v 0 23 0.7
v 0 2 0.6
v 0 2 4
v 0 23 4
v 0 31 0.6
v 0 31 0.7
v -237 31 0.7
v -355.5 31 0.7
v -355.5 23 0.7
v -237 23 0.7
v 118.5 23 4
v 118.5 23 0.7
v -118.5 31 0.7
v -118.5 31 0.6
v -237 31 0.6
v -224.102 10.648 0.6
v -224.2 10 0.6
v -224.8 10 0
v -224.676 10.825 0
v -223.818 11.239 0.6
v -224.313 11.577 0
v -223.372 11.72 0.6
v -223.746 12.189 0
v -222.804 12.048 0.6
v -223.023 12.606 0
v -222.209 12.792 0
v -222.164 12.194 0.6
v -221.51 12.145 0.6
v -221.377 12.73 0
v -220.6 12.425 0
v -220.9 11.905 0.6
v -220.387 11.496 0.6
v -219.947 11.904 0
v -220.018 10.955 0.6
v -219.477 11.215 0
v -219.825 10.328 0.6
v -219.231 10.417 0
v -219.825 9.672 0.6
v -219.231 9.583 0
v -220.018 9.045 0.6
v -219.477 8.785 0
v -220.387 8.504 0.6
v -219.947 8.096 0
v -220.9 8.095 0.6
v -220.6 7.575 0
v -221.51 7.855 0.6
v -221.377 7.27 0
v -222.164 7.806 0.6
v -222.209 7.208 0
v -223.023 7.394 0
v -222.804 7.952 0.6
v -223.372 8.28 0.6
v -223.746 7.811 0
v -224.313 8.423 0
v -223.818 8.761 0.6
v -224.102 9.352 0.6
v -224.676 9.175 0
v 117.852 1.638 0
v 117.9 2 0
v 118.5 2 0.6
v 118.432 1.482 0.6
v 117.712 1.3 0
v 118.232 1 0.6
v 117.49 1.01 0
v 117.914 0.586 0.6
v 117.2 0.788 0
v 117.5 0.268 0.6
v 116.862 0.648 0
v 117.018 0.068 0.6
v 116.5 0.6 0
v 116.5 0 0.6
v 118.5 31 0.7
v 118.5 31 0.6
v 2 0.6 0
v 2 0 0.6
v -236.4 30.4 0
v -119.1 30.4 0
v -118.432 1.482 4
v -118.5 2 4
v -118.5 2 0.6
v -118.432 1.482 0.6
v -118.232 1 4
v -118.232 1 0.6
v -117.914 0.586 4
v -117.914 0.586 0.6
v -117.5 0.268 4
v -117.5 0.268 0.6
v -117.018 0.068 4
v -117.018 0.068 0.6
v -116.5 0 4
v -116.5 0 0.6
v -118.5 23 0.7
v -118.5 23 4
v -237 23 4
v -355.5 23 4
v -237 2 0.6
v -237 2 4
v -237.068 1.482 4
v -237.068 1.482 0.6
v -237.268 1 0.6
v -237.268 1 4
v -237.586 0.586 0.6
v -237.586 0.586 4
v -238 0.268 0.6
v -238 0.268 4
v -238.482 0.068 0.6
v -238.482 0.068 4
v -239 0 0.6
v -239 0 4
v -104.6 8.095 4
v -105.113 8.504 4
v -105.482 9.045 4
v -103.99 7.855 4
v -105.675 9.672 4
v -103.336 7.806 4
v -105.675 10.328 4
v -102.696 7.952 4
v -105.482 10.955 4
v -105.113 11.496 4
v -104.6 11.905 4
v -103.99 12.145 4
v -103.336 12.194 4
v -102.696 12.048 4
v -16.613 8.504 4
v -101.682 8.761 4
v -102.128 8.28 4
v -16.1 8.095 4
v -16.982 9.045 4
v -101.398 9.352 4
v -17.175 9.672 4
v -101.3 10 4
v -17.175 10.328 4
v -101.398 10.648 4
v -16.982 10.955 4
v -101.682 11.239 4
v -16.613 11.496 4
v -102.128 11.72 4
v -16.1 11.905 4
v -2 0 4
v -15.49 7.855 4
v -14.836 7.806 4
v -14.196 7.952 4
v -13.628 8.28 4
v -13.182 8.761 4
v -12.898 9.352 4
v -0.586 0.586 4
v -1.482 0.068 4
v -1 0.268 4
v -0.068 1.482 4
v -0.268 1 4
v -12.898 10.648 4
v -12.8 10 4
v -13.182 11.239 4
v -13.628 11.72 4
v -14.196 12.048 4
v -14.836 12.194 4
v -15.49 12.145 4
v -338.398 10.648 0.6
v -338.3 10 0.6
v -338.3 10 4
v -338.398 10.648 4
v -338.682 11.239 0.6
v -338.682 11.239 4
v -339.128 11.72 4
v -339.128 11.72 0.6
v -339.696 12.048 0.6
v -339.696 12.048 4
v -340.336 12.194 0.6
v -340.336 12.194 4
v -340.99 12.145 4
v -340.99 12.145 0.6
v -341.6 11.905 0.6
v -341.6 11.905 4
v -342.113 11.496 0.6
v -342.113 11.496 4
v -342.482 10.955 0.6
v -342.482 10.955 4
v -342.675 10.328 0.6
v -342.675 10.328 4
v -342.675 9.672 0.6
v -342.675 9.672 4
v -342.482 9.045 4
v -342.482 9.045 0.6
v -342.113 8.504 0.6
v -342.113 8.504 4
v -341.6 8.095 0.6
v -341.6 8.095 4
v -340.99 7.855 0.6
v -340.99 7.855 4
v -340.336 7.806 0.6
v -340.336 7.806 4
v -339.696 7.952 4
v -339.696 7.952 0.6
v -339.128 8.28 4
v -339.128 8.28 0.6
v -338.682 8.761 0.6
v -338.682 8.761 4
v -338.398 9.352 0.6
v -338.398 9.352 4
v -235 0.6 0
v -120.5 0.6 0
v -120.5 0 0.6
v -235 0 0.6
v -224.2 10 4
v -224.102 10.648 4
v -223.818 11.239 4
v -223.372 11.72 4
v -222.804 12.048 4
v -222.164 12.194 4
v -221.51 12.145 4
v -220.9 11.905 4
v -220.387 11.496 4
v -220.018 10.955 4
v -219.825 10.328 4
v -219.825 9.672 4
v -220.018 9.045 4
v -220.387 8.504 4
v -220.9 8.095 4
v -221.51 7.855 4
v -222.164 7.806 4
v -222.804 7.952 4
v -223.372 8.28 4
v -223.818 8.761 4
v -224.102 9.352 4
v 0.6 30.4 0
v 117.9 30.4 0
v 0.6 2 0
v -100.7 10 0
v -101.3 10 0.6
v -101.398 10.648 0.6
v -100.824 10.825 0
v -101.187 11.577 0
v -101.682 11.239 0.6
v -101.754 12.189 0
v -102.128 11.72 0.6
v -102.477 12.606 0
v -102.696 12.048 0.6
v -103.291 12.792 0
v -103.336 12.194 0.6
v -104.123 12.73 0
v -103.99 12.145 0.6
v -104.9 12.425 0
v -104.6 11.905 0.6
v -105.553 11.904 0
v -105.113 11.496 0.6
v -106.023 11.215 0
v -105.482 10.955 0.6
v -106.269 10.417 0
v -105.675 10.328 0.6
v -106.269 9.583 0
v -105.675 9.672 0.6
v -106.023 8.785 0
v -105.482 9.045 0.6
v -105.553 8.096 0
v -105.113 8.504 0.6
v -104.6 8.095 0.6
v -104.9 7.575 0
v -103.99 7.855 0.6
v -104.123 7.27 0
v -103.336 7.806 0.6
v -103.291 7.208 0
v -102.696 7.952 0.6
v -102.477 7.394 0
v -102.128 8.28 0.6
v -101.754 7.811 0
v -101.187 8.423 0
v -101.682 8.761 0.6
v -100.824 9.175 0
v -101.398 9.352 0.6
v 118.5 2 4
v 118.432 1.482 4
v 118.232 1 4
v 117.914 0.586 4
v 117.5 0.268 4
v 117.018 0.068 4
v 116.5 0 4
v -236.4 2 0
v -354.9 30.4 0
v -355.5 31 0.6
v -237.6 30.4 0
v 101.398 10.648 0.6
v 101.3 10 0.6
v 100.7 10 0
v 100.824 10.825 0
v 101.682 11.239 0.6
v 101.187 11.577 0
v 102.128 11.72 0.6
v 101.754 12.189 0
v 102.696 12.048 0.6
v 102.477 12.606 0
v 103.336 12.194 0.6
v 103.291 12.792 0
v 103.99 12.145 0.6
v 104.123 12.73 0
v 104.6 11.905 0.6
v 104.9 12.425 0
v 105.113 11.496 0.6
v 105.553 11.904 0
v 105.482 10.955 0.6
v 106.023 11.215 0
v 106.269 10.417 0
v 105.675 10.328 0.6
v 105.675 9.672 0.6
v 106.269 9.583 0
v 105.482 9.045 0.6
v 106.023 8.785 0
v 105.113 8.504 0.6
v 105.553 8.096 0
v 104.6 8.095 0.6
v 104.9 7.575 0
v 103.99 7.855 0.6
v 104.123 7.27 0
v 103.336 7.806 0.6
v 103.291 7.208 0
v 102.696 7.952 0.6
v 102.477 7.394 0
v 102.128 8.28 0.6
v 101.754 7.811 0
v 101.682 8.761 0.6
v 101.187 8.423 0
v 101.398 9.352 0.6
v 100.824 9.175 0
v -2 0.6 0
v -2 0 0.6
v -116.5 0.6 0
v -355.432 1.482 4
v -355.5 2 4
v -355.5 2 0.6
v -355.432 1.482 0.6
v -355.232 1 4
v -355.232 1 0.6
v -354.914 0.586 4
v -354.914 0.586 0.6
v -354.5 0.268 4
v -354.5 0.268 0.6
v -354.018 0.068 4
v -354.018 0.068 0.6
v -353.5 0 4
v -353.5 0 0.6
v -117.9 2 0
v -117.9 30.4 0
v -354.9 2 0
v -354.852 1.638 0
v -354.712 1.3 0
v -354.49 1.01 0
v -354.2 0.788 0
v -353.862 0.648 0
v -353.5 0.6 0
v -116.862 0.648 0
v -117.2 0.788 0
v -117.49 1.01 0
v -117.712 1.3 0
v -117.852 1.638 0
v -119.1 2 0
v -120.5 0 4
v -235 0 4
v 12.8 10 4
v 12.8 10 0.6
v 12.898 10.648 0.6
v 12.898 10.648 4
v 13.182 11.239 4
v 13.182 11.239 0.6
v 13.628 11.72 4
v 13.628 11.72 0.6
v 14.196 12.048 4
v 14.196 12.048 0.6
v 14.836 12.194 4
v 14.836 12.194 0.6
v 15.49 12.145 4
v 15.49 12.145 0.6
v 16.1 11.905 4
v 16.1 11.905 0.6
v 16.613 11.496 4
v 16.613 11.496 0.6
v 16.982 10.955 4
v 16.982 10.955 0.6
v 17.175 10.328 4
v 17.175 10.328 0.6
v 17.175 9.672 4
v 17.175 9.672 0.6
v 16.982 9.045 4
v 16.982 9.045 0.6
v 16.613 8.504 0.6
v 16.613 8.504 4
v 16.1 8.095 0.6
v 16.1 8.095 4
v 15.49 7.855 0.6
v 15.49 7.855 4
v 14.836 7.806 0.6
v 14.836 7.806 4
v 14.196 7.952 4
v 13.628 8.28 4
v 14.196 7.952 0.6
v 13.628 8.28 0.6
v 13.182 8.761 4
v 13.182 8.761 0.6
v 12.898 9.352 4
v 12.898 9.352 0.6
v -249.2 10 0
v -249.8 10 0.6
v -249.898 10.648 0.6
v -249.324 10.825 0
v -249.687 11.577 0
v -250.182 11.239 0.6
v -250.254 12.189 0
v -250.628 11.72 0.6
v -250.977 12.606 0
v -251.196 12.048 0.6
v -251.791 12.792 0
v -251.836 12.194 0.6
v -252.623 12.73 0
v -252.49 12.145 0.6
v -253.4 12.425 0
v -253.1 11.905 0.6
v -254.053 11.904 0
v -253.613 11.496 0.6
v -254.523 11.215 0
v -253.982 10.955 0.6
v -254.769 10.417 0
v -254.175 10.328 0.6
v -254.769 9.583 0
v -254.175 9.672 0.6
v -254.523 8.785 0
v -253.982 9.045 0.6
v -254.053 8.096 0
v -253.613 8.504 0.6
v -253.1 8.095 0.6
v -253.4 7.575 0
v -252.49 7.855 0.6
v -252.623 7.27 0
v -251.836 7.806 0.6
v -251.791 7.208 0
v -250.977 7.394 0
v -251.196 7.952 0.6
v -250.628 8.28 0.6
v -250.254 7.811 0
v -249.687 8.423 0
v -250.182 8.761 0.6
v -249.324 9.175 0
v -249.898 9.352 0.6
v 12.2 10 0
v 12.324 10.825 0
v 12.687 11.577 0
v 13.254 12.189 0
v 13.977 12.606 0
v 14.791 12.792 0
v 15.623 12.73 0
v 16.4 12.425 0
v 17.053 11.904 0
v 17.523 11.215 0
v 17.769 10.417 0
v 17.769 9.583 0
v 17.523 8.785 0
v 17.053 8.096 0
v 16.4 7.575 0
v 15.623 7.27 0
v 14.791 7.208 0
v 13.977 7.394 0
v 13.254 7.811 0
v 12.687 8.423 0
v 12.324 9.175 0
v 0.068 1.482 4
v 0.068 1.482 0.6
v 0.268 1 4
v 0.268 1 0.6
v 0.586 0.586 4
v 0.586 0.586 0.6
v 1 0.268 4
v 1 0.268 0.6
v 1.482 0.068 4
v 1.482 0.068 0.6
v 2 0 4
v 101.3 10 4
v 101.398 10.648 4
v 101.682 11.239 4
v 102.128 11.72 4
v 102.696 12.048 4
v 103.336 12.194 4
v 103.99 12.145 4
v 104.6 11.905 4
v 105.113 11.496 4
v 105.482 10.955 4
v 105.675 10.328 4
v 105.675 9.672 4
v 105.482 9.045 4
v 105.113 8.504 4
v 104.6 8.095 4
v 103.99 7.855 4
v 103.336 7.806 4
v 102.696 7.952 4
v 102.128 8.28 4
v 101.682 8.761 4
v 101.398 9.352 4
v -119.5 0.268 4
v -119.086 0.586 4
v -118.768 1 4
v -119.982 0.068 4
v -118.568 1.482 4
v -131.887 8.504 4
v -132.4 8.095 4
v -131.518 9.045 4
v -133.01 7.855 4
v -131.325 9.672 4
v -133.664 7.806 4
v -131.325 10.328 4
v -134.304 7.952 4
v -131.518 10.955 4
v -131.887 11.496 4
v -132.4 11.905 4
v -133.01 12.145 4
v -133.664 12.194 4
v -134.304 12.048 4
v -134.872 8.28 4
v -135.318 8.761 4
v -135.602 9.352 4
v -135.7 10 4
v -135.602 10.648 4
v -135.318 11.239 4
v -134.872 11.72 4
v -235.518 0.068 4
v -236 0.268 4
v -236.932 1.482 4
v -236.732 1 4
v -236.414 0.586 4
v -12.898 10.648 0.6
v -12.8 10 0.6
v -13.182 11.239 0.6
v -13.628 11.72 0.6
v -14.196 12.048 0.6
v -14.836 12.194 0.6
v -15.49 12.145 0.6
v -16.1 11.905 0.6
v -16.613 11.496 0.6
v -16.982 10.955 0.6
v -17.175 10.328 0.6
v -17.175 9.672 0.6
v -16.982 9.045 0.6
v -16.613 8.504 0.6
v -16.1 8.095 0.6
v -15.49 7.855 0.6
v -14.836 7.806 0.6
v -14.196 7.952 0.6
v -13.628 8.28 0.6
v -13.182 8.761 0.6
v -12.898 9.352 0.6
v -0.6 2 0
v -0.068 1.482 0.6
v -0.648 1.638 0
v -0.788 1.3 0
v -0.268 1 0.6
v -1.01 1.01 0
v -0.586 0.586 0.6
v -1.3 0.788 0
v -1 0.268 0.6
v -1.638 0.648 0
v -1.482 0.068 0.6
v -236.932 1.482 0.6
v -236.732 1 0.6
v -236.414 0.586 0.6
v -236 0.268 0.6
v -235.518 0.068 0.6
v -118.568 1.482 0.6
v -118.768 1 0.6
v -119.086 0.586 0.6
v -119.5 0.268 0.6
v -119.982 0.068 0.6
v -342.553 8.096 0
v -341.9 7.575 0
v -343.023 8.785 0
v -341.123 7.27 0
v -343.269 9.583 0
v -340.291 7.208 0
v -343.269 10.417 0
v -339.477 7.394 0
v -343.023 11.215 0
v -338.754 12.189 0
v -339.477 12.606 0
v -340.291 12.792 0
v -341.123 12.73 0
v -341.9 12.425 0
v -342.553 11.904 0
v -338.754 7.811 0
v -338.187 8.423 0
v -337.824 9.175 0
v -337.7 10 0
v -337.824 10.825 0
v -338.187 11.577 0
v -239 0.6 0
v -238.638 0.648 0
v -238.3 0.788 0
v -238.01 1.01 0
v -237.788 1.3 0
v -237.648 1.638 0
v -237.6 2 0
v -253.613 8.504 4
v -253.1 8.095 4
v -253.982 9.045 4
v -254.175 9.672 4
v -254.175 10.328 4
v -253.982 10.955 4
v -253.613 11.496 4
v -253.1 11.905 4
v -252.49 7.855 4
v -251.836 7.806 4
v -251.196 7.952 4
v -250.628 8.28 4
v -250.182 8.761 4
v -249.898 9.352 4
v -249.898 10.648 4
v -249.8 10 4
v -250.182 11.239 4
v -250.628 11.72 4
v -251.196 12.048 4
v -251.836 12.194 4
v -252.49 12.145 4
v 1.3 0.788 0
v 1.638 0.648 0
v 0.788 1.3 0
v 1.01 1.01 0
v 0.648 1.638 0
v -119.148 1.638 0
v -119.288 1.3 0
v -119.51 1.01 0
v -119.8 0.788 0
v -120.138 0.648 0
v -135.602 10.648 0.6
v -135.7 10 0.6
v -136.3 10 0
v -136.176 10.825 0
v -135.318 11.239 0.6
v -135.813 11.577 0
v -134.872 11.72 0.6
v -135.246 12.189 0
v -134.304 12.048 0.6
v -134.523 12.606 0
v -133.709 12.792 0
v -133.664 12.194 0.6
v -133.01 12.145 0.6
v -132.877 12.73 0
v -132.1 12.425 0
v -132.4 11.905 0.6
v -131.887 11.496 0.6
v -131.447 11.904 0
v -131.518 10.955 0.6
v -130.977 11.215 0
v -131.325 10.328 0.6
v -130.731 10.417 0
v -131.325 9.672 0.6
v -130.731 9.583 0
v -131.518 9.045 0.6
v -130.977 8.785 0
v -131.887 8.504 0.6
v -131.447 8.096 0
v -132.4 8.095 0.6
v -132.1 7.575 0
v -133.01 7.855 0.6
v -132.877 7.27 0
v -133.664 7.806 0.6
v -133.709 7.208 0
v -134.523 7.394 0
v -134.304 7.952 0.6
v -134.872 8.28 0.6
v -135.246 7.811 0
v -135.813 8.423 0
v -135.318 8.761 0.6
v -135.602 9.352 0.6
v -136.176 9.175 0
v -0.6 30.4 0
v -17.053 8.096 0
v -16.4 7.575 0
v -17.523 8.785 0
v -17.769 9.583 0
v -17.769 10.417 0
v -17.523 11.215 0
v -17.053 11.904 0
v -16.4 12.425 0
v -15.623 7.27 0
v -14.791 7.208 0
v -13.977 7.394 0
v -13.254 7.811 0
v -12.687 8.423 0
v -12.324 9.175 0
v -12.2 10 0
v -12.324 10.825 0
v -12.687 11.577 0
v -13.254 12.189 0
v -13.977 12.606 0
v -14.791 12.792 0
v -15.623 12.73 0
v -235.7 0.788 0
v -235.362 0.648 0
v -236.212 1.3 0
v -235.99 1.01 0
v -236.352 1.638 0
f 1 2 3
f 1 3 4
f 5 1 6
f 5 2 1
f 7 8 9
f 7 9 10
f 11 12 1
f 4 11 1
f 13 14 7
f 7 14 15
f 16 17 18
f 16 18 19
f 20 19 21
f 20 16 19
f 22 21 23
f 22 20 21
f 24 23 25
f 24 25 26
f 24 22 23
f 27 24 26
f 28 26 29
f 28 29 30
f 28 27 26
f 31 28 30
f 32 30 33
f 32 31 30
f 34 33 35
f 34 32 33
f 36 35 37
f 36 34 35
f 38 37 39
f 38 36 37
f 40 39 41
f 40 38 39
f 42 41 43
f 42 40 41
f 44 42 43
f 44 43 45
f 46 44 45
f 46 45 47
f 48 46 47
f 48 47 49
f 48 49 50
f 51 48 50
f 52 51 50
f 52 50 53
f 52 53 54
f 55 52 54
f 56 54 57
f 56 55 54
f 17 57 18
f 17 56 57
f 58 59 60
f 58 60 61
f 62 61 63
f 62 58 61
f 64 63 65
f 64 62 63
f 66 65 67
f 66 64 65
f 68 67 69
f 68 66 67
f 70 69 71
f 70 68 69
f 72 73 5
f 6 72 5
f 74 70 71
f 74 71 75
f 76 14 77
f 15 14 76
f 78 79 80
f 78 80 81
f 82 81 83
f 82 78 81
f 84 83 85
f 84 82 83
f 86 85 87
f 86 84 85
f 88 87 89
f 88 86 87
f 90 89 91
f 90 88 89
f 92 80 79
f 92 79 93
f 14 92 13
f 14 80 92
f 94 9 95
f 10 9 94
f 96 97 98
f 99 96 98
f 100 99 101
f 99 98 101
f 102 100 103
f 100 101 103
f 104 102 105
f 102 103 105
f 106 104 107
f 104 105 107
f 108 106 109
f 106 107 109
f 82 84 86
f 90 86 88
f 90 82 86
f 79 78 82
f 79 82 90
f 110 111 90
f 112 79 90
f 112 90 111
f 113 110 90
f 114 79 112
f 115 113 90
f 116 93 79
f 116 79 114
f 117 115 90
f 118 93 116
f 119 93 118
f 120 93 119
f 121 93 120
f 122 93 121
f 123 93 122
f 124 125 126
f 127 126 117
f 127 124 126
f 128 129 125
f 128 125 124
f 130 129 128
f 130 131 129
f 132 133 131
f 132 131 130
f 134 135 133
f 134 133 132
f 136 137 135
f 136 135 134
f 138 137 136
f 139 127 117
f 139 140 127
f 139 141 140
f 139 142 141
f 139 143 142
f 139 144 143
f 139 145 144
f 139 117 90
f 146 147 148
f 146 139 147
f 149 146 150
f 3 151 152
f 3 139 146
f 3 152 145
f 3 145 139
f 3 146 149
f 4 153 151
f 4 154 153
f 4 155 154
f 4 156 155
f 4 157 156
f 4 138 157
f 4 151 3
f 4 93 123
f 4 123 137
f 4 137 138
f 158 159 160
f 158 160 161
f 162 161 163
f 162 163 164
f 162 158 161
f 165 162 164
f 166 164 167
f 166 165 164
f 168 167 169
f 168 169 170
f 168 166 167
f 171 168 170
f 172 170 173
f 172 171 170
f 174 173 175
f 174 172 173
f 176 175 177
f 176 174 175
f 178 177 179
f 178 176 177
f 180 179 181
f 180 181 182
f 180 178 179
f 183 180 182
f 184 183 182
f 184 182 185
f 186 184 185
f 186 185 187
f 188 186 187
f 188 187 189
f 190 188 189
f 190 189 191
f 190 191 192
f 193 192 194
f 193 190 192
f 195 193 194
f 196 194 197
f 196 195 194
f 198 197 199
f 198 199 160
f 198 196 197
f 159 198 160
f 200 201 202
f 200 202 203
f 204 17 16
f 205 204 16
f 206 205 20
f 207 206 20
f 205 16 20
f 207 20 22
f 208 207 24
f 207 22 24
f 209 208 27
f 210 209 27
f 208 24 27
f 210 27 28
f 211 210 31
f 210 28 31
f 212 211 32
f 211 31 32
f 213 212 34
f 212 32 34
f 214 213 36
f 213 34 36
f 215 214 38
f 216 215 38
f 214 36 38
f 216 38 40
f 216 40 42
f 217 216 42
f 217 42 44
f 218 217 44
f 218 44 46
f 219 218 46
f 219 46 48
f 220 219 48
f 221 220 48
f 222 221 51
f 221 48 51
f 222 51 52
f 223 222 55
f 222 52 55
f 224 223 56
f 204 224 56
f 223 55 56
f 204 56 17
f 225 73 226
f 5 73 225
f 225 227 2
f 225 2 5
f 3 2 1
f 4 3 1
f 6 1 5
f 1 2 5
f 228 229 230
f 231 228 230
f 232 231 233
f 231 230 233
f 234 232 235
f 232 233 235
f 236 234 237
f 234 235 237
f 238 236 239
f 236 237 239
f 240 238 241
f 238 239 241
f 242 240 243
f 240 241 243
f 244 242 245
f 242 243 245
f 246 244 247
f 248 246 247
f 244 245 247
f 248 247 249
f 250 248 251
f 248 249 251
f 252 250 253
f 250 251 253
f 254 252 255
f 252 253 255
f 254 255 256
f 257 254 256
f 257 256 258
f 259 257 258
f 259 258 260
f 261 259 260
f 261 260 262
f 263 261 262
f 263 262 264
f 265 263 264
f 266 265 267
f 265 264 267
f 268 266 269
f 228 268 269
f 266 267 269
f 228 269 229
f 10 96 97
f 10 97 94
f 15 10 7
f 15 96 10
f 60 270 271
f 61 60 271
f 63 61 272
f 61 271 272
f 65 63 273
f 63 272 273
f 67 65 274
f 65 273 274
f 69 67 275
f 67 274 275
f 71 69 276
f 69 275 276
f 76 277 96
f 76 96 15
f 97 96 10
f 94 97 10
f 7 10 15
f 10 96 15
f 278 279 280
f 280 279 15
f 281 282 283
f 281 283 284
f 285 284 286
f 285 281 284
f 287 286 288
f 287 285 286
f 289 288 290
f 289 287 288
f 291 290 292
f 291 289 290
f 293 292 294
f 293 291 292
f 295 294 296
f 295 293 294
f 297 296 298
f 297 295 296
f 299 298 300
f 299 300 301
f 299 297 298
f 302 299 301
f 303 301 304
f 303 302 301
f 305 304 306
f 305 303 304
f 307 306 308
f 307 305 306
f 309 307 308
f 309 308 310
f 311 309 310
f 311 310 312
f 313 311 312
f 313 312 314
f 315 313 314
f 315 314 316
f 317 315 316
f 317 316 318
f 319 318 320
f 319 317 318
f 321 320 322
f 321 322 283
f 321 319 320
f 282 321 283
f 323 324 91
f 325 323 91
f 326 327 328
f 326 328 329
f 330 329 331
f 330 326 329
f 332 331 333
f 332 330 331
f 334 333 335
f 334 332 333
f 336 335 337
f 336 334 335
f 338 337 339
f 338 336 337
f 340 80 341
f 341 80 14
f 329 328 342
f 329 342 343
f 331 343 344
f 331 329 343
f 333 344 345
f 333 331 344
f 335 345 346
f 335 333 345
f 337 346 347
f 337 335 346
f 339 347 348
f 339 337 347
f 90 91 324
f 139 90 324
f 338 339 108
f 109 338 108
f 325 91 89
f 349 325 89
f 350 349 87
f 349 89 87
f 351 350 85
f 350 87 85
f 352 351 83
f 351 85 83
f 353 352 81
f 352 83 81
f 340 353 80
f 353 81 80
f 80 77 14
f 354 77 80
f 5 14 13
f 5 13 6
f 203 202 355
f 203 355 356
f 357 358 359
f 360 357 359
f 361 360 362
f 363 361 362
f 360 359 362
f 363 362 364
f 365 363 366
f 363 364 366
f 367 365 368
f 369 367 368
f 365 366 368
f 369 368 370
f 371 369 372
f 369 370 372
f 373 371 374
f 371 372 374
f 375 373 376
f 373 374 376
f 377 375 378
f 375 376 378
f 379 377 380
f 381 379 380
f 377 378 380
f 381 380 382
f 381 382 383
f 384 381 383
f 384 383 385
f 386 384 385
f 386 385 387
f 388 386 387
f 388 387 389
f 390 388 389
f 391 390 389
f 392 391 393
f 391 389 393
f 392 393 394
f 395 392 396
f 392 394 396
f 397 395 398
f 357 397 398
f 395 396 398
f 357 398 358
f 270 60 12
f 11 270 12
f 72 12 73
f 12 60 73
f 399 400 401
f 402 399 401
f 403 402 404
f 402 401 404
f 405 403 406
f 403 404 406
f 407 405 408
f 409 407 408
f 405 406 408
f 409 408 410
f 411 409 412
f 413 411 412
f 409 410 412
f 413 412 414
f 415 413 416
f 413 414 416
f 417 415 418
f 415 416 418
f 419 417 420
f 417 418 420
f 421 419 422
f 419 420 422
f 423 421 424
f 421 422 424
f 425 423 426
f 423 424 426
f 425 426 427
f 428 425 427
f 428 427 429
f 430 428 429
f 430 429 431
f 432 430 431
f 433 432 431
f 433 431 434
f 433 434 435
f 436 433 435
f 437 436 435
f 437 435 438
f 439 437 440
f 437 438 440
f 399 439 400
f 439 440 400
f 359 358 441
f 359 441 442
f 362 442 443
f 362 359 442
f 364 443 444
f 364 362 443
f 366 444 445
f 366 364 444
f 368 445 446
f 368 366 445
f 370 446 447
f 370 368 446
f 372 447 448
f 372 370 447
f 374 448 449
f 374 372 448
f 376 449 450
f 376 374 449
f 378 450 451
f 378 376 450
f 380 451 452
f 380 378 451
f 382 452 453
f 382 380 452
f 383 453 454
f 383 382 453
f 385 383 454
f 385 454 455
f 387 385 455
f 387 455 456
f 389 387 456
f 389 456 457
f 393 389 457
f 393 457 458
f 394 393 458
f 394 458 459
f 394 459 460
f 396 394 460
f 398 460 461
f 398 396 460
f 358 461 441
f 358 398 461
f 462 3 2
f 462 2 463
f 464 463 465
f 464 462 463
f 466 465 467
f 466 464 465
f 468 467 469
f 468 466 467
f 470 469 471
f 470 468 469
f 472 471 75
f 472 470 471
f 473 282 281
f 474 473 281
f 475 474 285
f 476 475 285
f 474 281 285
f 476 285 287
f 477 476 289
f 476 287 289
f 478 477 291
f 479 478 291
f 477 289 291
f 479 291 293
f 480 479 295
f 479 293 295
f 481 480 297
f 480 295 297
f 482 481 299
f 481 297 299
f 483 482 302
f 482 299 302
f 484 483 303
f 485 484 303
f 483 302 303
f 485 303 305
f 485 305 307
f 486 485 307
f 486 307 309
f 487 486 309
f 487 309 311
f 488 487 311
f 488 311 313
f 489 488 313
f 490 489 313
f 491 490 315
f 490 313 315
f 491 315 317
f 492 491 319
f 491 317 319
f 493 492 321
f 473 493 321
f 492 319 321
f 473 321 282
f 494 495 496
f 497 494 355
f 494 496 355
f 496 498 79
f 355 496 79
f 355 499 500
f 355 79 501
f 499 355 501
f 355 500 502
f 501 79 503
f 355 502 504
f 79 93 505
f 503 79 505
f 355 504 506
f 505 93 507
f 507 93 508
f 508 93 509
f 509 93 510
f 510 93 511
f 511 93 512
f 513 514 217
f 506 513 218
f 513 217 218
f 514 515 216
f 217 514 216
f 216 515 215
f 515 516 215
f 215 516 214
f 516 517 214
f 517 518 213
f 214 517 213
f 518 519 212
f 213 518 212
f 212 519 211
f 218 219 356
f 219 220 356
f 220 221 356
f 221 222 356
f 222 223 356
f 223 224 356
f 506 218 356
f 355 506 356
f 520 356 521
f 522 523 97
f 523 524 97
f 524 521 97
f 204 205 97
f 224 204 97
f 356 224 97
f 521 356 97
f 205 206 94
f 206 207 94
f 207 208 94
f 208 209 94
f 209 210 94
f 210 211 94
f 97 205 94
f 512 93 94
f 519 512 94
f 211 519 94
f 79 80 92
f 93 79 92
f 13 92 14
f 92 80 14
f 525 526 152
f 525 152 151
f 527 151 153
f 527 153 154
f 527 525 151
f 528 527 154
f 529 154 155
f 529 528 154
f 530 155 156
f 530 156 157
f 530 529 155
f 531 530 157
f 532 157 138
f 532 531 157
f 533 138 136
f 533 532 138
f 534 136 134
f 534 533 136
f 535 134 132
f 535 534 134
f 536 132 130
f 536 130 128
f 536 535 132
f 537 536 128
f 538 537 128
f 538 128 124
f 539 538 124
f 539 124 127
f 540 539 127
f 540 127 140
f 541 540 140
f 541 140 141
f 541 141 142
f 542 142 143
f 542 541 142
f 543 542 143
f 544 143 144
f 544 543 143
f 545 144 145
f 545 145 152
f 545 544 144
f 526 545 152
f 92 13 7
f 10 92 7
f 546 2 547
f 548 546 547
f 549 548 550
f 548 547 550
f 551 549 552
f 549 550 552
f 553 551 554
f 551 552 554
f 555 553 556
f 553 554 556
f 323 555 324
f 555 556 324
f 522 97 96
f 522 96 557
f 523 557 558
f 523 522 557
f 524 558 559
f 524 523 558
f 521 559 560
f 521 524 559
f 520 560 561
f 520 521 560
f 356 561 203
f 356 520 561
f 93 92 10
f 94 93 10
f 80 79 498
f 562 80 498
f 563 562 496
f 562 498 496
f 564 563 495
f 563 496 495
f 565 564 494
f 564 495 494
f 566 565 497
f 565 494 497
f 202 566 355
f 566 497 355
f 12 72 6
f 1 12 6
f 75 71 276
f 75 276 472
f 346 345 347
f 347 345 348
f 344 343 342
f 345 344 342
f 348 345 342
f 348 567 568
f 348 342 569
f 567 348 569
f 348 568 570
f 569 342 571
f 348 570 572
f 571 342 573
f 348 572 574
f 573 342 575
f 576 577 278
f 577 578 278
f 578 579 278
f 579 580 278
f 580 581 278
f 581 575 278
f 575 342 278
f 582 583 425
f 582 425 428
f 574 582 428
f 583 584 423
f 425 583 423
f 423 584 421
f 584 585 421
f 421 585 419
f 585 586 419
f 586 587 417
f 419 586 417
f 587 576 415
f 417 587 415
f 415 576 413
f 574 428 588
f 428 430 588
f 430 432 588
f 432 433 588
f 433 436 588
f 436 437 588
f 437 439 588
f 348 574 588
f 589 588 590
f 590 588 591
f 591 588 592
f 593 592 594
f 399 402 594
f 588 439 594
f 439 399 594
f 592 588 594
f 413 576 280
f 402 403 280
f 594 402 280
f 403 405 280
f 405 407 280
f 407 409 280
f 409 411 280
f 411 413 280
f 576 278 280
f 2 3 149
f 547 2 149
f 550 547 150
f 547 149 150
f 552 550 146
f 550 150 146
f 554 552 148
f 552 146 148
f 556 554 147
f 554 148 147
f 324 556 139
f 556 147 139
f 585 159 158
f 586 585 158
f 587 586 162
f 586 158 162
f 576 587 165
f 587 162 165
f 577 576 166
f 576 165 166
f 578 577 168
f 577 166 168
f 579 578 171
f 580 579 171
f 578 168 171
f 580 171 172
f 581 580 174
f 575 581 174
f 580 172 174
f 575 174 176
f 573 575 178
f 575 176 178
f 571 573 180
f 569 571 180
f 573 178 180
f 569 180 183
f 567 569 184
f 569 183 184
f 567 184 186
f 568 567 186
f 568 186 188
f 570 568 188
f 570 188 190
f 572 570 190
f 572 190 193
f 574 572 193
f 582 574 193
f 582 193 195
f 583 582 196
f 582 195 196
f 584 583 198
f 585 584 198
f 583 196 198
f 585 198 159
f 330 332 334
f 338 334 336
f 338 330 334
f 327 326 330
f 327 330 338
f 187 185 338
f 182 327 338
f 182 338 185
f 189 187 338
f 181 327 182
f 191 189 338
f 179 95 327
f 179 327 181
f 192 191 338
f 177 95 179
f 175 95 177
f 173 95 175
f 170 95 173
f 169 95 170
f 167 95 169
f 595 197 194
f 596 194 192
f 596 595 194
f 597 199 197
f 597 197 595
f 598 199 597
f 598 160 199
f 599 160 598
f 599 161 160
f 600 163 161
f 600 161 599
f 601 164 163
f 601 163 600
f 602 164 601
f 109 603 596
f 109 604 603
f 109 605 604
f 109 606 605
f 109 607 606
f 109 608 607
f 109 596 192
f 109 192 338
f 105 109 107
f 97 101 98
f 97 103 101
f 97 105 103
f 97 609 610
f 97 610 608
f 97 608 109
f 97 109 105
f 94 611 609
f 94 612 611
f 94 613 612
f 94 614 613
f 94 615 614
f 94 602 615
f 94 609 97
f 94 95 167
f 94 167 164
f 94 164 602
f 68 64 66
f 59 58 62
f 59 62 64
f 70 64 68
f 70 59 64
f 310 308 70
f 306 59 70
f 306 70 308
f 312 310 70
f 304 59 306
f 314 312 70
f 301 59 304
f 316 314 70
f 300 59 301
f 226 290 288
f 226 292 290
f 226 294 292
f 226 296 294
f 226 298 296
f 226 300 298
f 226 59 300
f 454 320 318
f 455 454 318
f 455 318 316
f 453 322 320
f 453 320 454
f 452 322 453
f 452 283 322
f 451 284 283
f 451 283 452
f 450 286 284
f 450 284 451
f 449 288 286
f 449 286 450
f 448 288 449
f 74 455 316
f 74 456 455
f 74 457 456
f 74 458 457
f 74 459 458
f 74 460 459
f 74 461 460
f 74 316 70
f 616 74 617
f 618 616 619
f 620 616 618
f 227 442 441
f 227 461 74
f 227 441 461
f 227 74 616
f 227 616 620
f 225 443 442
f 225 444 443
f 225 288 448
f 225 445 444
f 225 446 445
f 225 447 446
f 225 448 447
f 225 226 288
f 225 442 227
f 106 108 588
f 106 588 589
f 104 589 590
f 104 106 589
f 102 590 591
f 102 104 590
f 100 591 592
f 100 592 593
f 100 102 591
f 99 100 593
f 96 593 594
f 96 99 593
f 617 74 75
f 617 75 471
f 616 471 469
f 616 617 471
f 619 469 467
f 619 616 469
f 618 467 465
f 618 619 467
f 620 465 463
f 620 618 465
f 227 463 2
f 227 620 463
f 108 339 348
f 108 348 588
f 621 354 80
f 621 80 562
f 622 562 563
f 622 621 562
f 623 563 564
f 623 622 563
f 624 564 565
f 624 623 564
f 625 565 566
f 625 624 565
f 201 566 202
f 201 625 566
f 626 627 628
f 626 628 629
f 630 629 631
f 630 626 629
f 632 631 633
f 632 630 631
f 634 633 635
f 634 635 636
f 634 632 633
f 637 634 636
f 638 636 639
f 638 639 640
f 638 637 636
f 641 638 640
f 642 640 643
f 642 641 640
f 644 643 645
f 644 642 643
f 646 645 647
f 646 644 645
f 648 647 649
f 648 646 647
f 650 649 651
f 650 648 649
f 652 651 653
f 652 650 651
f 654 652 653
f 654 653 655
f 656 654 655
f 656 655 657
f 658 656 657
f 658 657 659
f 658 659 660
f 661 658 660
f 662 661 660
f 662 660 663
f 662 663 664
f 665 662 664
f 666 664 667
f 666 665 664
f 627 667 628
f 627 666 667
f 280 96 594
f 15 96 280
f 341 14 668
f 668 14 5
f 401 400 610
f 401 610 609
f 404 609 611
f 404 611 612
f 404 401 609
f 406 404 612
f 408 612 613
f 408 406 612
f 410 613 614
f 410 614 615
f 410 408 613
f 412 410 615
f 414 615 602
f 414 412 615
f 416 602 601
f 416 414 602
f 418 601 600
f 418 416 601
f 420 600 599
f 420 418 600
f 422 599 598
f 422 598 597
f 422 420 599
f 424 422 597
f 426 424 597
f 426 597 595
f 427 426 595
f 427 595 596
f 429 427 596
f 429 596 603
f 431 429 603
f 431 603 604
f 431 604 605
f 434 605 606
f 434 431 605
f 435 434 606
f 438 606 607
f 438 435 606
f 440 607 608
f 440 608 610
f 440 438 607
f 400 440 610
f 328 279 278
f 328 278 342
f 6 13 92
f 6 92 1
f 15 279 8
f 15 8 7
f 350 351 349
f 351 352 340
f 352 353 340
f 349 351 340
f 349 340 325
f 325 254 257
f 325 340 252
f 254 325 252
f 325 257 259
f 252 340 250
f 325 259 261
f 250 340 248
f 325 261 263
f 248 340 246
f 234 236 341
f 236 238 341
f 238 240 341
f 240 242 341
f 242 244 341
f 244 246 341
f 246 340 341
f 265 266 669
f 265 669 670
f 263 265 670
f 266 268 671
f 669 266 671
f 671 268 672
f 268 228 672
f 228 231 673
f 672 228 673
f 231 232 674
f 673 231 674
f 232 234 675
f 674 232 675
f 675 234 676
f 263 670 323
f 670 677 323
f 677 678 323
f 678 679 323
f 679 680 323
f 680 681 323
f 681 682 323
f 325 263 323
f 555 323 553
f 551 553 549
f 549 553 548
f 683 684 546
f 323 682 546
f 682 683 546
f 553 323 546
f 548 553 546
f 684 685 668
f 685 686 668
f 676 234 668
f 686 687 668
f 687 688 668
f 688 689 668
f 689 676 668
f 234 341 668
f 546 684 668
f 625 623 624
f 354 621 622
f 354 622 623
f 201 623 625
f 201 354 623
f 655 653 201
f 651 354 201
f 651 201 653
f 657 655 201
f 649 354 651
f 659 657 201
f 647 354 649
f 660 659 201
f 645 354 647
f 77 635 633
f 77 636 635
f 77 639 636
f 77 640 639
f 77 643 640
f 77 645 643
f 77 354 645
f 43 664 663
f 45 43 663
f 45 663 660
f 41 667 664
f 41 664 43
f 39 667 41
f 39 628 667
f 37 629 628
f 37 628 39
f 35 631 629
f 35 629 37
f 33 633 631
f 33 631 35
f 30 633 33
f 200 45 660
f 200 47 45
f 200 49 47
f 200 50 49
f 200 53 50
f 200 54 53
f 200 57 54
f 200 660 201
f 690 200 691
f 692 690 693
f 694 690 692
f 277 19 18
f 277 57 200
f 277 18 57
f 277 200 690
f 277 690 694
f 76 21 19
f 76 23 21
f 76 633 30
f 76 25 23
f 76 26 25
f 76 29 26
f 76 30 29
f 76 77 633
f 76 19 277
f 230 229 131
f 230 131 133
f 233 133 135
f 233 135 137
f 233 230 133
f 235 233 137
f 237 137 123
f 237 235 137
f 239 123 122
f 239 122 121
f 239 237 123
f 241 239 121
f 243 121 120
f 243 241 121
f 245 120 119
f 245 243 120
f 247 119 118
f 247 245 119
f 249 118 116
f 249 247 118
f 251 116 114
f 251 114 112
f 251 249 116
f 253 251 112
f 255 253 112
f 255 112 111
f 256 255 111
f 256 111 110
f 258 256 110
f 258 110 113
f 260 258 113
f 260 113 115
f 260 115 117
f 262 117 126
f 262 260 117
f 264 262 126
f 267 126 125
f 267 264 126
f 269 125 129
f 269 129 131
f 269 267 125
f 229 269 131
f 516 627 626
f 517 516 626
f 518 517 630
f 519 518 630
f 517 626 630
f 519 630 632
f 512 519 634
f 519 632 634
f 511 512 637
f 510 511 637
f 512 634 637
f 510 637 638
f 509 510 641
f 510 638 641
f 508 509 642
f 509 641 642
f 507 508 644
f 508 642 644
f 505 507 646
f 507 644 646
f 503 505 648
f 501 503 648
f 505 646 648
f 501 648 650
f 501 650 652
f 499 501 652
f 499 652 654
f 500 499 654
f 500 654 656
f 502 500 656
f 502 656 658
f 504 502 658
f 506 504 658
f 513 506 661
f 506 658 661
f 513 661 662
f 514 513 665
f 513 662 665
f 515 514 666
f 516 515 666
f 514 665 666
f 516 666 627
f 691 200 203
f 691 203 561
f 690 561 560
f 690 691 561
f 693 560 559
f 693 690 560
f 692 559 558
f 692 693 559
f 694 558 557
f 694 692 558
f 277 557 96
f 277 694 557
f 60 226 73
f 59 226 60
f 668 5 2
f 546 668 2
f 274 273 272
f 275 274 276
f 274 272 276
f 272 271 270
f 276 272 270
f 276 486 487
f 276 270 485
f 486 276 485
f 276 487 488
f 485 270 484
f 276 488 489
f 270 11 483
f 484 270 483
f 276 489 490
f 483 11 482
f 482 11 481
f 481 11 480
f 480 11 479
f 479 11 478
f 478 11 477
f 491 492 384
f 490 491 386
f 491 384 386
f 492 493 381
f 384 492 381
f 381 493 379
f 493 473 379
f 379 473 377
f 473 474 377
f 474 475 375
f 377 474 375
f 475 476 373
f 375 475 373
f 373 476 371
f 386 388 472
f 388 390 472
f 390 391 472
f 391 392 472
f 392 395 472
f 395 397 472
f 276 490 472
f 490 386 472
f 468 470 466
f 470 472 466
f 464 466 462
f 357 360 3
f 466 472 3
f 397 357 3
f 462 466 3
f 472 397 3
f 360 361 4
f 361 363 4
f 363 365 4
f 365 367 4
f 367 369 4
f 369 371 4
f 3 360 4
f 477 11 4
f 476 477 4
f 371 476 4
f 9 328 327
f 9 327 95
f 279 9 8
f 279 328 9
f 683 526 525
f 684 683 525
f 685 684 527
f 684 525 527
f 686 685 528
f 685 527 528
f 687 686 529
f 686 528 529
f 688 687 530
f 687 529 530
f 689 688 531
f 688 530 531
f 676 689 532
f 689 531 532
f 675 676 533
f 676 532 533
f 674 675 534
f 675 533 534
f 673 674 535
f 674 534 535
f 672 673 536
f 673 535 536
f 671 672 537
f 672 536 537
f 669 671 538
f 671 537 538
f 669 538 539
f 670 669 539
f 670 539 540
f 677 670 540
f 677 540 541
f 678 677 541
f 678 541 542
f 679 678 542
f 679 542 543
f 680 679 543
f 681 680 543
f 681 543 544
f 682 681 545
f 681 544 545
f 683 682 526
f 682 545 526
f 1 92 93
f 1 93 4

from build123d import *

# Parameters (mm, degrees)
SKETCH1_W           = 118.5
SKETCH1_H           = 23
SKETCH1_R           = 2.2
BOSS_EXTRUDE1_DEPTH = 4
SKETCH1_3_W         = 118.5
SKETCH1_3_H         = 8
BOSS_EXTRUDE2_DEPTH = 0.7
FILLET2_R           = 2
FILLET3_R           = 2
FILLET5_R           = 2
FILLET6_R           = 2
CHAMFER6_SIZE       = 0.6
CHAMFER5_SIZE       = 0.6
CHAMFER3_SIZE       = 0.6
CHAMFER4_SIZE       = 0.6


with BuildPart() as part:
    # Sketch1 → Boss-Extrude1 (new body)
    with BuildSketch(Plane.XY):
        with Locations((-59.25, 11.5)):
            Rectangle(SKETCH1_W, SKETCH1_H)
        with Locations((-15, 10)):
            Circle(SKETCH1_R, mode=Mode.SUBTRACT)
        with Locations((-103.5, 10)):
            Circle(SKETCH1_R, mode=Mode.SUBTRACT)
    extrude(amount=BOSS_EXTRUDE1_DEPTH)

    # Sketch1<3> → Boss-Extrude2 (add)
    with BuildSketch(Plane.XY):
        with Locations((-59.25, 27)):
            Rectangle(SKETCH1_3_W, SKETCH1_3_H)
    extrude(amount=BOSS_EXTRUDE2_DEPTH)


with BuildPart() as body_2:
    # Mirror1: mirrored copy
    add(part.part.mirror(Plane(origin=(0, 0, 4), x_dir=(0, 0, 1), z_dir=(-1, 0, 0))))


with BuildPart() as body_3:
    # Mirror2: mirrored copy
    add(part.part.mirror(Plane(origin=(-118.5, 0, 4), x_dir=(0, 0, 1), z_dir=(-1, 0, 0))))

    # Fillet6
    fillet6_edges = [body_3.edges().sort_by_distance(p)[0] for p in [
        (-237, 0, 2),
        (-118.5, 0, 2),
    ]]
    fillet(fillet6_edges, radius=FILLET6_R)

    # Chamfer5
    chamfer5_edges = [body_3.edges().sort_by_distance(p)[0] for p in [
        (-131.3, 10, 0),
        (-219.8, 10, 0),
        (-177.75, 31, 0),
        (-118.5, 16.5, 0),
        (-177.75, 0, 0),
        (-237, 16.5, 0),
        (-236.414213562, 0.585786438, 0),
        (-119.085786438, 0.585786438, 0),
    ]]
    chamfer(chamfer5_edges, length=CHAMFER5_SIZE)


with BuildPart() as body_4:
    # Mirror2 2: mirrored copy
    add(body_2.part.mirror(Plane(origin=(-118.5, 0, 4), x_dir=(0, 0, 1), z_dir=(-1, 0, 0))))

    # Fillet5
    fillet5_edges = [body_4.edges().sort_by_distance(p)[0] for p in [
        (-237, 0, 2),
        (-355.5, 0, 2),
    ]]
    fillet(fillet5_edges, radius=FILLET5_R)

    # Chamfer6
    chamfer6_edges = [body_4.edges().sort_by_distance(p)[0] for p in [
        (-342.7, 10, 0),
        (-254.2, 10, 0),
        (-296.25, 31, 0),
        (-296.25, 0, 0),
        (-355.5, 16.5, 0),
        (-237, 16.5, 0),
        (-237.585786438, 0.585786438, 0),
        (-354.914213562, 0.585786438, 0),
    ]]
    chamfer(chamfer6_edges, length=CHAMFER6_SIZE)


with BuildPart() as part_1:
    add(part.part)

    # Fillet2
    fillet2_edges = [part_1.edges().sort_by_distance(p)[0] for p in [
        (0, 0, 2),
        (-118.5, 0, 2),
    ]]
    fillet(fillet2_edges, radius=FILLET2_R)

    # Chamfer4
    chamfer4_edges = [part_1.edges().sort_by_distance(p)[0] for p in [
        (-105.7, 10, 0),
        (-17.2, 10, 0),
        (-59.25, 31, 0),
        (0, 16.5, 0),
        (-118.5, 16.5, 0),
        (-59.25, 0, 0),
        (-117.914213562, 0.585786438, 0),
        (-0.585786438, 0.585786438, 0),
    ]]
    chamfer(chamfer4_edges, length=CHAMFER4_SIZE)


with BuildPart() as body_2_1:
    add(body_2.part)

    # Fillet3
    fillet3_edges = [body_2_1.edges().sort_by_distance(p)[0] for p in [
        (0, 0, 2),
        (118.5, 0, 2),
    ]]
    fillet(fillet3_edges, radius=FILLET3_R)

    # Chamfer3
    chamfer3_edges = [body_2_1.edges().sort_by_distance(p)[0] for p in [
        (105.7, 10, 0),
        (17.2, 10, 0),
        (59.25, 31, 0),
        (118.5, 16.5, 0),
        (59.25, 0, 0),
        (0, 16.5, 0),
        (0.585786438, 0.585786438, 0),
        (117.914213562, 0.585786438, 0),
    ]]
    chamfer(chamfer3_edges, length=CHAMFER3_SIZE)


solid = Compound([body_3.part, body_4.part, part_1.part, body_2_1.part])
